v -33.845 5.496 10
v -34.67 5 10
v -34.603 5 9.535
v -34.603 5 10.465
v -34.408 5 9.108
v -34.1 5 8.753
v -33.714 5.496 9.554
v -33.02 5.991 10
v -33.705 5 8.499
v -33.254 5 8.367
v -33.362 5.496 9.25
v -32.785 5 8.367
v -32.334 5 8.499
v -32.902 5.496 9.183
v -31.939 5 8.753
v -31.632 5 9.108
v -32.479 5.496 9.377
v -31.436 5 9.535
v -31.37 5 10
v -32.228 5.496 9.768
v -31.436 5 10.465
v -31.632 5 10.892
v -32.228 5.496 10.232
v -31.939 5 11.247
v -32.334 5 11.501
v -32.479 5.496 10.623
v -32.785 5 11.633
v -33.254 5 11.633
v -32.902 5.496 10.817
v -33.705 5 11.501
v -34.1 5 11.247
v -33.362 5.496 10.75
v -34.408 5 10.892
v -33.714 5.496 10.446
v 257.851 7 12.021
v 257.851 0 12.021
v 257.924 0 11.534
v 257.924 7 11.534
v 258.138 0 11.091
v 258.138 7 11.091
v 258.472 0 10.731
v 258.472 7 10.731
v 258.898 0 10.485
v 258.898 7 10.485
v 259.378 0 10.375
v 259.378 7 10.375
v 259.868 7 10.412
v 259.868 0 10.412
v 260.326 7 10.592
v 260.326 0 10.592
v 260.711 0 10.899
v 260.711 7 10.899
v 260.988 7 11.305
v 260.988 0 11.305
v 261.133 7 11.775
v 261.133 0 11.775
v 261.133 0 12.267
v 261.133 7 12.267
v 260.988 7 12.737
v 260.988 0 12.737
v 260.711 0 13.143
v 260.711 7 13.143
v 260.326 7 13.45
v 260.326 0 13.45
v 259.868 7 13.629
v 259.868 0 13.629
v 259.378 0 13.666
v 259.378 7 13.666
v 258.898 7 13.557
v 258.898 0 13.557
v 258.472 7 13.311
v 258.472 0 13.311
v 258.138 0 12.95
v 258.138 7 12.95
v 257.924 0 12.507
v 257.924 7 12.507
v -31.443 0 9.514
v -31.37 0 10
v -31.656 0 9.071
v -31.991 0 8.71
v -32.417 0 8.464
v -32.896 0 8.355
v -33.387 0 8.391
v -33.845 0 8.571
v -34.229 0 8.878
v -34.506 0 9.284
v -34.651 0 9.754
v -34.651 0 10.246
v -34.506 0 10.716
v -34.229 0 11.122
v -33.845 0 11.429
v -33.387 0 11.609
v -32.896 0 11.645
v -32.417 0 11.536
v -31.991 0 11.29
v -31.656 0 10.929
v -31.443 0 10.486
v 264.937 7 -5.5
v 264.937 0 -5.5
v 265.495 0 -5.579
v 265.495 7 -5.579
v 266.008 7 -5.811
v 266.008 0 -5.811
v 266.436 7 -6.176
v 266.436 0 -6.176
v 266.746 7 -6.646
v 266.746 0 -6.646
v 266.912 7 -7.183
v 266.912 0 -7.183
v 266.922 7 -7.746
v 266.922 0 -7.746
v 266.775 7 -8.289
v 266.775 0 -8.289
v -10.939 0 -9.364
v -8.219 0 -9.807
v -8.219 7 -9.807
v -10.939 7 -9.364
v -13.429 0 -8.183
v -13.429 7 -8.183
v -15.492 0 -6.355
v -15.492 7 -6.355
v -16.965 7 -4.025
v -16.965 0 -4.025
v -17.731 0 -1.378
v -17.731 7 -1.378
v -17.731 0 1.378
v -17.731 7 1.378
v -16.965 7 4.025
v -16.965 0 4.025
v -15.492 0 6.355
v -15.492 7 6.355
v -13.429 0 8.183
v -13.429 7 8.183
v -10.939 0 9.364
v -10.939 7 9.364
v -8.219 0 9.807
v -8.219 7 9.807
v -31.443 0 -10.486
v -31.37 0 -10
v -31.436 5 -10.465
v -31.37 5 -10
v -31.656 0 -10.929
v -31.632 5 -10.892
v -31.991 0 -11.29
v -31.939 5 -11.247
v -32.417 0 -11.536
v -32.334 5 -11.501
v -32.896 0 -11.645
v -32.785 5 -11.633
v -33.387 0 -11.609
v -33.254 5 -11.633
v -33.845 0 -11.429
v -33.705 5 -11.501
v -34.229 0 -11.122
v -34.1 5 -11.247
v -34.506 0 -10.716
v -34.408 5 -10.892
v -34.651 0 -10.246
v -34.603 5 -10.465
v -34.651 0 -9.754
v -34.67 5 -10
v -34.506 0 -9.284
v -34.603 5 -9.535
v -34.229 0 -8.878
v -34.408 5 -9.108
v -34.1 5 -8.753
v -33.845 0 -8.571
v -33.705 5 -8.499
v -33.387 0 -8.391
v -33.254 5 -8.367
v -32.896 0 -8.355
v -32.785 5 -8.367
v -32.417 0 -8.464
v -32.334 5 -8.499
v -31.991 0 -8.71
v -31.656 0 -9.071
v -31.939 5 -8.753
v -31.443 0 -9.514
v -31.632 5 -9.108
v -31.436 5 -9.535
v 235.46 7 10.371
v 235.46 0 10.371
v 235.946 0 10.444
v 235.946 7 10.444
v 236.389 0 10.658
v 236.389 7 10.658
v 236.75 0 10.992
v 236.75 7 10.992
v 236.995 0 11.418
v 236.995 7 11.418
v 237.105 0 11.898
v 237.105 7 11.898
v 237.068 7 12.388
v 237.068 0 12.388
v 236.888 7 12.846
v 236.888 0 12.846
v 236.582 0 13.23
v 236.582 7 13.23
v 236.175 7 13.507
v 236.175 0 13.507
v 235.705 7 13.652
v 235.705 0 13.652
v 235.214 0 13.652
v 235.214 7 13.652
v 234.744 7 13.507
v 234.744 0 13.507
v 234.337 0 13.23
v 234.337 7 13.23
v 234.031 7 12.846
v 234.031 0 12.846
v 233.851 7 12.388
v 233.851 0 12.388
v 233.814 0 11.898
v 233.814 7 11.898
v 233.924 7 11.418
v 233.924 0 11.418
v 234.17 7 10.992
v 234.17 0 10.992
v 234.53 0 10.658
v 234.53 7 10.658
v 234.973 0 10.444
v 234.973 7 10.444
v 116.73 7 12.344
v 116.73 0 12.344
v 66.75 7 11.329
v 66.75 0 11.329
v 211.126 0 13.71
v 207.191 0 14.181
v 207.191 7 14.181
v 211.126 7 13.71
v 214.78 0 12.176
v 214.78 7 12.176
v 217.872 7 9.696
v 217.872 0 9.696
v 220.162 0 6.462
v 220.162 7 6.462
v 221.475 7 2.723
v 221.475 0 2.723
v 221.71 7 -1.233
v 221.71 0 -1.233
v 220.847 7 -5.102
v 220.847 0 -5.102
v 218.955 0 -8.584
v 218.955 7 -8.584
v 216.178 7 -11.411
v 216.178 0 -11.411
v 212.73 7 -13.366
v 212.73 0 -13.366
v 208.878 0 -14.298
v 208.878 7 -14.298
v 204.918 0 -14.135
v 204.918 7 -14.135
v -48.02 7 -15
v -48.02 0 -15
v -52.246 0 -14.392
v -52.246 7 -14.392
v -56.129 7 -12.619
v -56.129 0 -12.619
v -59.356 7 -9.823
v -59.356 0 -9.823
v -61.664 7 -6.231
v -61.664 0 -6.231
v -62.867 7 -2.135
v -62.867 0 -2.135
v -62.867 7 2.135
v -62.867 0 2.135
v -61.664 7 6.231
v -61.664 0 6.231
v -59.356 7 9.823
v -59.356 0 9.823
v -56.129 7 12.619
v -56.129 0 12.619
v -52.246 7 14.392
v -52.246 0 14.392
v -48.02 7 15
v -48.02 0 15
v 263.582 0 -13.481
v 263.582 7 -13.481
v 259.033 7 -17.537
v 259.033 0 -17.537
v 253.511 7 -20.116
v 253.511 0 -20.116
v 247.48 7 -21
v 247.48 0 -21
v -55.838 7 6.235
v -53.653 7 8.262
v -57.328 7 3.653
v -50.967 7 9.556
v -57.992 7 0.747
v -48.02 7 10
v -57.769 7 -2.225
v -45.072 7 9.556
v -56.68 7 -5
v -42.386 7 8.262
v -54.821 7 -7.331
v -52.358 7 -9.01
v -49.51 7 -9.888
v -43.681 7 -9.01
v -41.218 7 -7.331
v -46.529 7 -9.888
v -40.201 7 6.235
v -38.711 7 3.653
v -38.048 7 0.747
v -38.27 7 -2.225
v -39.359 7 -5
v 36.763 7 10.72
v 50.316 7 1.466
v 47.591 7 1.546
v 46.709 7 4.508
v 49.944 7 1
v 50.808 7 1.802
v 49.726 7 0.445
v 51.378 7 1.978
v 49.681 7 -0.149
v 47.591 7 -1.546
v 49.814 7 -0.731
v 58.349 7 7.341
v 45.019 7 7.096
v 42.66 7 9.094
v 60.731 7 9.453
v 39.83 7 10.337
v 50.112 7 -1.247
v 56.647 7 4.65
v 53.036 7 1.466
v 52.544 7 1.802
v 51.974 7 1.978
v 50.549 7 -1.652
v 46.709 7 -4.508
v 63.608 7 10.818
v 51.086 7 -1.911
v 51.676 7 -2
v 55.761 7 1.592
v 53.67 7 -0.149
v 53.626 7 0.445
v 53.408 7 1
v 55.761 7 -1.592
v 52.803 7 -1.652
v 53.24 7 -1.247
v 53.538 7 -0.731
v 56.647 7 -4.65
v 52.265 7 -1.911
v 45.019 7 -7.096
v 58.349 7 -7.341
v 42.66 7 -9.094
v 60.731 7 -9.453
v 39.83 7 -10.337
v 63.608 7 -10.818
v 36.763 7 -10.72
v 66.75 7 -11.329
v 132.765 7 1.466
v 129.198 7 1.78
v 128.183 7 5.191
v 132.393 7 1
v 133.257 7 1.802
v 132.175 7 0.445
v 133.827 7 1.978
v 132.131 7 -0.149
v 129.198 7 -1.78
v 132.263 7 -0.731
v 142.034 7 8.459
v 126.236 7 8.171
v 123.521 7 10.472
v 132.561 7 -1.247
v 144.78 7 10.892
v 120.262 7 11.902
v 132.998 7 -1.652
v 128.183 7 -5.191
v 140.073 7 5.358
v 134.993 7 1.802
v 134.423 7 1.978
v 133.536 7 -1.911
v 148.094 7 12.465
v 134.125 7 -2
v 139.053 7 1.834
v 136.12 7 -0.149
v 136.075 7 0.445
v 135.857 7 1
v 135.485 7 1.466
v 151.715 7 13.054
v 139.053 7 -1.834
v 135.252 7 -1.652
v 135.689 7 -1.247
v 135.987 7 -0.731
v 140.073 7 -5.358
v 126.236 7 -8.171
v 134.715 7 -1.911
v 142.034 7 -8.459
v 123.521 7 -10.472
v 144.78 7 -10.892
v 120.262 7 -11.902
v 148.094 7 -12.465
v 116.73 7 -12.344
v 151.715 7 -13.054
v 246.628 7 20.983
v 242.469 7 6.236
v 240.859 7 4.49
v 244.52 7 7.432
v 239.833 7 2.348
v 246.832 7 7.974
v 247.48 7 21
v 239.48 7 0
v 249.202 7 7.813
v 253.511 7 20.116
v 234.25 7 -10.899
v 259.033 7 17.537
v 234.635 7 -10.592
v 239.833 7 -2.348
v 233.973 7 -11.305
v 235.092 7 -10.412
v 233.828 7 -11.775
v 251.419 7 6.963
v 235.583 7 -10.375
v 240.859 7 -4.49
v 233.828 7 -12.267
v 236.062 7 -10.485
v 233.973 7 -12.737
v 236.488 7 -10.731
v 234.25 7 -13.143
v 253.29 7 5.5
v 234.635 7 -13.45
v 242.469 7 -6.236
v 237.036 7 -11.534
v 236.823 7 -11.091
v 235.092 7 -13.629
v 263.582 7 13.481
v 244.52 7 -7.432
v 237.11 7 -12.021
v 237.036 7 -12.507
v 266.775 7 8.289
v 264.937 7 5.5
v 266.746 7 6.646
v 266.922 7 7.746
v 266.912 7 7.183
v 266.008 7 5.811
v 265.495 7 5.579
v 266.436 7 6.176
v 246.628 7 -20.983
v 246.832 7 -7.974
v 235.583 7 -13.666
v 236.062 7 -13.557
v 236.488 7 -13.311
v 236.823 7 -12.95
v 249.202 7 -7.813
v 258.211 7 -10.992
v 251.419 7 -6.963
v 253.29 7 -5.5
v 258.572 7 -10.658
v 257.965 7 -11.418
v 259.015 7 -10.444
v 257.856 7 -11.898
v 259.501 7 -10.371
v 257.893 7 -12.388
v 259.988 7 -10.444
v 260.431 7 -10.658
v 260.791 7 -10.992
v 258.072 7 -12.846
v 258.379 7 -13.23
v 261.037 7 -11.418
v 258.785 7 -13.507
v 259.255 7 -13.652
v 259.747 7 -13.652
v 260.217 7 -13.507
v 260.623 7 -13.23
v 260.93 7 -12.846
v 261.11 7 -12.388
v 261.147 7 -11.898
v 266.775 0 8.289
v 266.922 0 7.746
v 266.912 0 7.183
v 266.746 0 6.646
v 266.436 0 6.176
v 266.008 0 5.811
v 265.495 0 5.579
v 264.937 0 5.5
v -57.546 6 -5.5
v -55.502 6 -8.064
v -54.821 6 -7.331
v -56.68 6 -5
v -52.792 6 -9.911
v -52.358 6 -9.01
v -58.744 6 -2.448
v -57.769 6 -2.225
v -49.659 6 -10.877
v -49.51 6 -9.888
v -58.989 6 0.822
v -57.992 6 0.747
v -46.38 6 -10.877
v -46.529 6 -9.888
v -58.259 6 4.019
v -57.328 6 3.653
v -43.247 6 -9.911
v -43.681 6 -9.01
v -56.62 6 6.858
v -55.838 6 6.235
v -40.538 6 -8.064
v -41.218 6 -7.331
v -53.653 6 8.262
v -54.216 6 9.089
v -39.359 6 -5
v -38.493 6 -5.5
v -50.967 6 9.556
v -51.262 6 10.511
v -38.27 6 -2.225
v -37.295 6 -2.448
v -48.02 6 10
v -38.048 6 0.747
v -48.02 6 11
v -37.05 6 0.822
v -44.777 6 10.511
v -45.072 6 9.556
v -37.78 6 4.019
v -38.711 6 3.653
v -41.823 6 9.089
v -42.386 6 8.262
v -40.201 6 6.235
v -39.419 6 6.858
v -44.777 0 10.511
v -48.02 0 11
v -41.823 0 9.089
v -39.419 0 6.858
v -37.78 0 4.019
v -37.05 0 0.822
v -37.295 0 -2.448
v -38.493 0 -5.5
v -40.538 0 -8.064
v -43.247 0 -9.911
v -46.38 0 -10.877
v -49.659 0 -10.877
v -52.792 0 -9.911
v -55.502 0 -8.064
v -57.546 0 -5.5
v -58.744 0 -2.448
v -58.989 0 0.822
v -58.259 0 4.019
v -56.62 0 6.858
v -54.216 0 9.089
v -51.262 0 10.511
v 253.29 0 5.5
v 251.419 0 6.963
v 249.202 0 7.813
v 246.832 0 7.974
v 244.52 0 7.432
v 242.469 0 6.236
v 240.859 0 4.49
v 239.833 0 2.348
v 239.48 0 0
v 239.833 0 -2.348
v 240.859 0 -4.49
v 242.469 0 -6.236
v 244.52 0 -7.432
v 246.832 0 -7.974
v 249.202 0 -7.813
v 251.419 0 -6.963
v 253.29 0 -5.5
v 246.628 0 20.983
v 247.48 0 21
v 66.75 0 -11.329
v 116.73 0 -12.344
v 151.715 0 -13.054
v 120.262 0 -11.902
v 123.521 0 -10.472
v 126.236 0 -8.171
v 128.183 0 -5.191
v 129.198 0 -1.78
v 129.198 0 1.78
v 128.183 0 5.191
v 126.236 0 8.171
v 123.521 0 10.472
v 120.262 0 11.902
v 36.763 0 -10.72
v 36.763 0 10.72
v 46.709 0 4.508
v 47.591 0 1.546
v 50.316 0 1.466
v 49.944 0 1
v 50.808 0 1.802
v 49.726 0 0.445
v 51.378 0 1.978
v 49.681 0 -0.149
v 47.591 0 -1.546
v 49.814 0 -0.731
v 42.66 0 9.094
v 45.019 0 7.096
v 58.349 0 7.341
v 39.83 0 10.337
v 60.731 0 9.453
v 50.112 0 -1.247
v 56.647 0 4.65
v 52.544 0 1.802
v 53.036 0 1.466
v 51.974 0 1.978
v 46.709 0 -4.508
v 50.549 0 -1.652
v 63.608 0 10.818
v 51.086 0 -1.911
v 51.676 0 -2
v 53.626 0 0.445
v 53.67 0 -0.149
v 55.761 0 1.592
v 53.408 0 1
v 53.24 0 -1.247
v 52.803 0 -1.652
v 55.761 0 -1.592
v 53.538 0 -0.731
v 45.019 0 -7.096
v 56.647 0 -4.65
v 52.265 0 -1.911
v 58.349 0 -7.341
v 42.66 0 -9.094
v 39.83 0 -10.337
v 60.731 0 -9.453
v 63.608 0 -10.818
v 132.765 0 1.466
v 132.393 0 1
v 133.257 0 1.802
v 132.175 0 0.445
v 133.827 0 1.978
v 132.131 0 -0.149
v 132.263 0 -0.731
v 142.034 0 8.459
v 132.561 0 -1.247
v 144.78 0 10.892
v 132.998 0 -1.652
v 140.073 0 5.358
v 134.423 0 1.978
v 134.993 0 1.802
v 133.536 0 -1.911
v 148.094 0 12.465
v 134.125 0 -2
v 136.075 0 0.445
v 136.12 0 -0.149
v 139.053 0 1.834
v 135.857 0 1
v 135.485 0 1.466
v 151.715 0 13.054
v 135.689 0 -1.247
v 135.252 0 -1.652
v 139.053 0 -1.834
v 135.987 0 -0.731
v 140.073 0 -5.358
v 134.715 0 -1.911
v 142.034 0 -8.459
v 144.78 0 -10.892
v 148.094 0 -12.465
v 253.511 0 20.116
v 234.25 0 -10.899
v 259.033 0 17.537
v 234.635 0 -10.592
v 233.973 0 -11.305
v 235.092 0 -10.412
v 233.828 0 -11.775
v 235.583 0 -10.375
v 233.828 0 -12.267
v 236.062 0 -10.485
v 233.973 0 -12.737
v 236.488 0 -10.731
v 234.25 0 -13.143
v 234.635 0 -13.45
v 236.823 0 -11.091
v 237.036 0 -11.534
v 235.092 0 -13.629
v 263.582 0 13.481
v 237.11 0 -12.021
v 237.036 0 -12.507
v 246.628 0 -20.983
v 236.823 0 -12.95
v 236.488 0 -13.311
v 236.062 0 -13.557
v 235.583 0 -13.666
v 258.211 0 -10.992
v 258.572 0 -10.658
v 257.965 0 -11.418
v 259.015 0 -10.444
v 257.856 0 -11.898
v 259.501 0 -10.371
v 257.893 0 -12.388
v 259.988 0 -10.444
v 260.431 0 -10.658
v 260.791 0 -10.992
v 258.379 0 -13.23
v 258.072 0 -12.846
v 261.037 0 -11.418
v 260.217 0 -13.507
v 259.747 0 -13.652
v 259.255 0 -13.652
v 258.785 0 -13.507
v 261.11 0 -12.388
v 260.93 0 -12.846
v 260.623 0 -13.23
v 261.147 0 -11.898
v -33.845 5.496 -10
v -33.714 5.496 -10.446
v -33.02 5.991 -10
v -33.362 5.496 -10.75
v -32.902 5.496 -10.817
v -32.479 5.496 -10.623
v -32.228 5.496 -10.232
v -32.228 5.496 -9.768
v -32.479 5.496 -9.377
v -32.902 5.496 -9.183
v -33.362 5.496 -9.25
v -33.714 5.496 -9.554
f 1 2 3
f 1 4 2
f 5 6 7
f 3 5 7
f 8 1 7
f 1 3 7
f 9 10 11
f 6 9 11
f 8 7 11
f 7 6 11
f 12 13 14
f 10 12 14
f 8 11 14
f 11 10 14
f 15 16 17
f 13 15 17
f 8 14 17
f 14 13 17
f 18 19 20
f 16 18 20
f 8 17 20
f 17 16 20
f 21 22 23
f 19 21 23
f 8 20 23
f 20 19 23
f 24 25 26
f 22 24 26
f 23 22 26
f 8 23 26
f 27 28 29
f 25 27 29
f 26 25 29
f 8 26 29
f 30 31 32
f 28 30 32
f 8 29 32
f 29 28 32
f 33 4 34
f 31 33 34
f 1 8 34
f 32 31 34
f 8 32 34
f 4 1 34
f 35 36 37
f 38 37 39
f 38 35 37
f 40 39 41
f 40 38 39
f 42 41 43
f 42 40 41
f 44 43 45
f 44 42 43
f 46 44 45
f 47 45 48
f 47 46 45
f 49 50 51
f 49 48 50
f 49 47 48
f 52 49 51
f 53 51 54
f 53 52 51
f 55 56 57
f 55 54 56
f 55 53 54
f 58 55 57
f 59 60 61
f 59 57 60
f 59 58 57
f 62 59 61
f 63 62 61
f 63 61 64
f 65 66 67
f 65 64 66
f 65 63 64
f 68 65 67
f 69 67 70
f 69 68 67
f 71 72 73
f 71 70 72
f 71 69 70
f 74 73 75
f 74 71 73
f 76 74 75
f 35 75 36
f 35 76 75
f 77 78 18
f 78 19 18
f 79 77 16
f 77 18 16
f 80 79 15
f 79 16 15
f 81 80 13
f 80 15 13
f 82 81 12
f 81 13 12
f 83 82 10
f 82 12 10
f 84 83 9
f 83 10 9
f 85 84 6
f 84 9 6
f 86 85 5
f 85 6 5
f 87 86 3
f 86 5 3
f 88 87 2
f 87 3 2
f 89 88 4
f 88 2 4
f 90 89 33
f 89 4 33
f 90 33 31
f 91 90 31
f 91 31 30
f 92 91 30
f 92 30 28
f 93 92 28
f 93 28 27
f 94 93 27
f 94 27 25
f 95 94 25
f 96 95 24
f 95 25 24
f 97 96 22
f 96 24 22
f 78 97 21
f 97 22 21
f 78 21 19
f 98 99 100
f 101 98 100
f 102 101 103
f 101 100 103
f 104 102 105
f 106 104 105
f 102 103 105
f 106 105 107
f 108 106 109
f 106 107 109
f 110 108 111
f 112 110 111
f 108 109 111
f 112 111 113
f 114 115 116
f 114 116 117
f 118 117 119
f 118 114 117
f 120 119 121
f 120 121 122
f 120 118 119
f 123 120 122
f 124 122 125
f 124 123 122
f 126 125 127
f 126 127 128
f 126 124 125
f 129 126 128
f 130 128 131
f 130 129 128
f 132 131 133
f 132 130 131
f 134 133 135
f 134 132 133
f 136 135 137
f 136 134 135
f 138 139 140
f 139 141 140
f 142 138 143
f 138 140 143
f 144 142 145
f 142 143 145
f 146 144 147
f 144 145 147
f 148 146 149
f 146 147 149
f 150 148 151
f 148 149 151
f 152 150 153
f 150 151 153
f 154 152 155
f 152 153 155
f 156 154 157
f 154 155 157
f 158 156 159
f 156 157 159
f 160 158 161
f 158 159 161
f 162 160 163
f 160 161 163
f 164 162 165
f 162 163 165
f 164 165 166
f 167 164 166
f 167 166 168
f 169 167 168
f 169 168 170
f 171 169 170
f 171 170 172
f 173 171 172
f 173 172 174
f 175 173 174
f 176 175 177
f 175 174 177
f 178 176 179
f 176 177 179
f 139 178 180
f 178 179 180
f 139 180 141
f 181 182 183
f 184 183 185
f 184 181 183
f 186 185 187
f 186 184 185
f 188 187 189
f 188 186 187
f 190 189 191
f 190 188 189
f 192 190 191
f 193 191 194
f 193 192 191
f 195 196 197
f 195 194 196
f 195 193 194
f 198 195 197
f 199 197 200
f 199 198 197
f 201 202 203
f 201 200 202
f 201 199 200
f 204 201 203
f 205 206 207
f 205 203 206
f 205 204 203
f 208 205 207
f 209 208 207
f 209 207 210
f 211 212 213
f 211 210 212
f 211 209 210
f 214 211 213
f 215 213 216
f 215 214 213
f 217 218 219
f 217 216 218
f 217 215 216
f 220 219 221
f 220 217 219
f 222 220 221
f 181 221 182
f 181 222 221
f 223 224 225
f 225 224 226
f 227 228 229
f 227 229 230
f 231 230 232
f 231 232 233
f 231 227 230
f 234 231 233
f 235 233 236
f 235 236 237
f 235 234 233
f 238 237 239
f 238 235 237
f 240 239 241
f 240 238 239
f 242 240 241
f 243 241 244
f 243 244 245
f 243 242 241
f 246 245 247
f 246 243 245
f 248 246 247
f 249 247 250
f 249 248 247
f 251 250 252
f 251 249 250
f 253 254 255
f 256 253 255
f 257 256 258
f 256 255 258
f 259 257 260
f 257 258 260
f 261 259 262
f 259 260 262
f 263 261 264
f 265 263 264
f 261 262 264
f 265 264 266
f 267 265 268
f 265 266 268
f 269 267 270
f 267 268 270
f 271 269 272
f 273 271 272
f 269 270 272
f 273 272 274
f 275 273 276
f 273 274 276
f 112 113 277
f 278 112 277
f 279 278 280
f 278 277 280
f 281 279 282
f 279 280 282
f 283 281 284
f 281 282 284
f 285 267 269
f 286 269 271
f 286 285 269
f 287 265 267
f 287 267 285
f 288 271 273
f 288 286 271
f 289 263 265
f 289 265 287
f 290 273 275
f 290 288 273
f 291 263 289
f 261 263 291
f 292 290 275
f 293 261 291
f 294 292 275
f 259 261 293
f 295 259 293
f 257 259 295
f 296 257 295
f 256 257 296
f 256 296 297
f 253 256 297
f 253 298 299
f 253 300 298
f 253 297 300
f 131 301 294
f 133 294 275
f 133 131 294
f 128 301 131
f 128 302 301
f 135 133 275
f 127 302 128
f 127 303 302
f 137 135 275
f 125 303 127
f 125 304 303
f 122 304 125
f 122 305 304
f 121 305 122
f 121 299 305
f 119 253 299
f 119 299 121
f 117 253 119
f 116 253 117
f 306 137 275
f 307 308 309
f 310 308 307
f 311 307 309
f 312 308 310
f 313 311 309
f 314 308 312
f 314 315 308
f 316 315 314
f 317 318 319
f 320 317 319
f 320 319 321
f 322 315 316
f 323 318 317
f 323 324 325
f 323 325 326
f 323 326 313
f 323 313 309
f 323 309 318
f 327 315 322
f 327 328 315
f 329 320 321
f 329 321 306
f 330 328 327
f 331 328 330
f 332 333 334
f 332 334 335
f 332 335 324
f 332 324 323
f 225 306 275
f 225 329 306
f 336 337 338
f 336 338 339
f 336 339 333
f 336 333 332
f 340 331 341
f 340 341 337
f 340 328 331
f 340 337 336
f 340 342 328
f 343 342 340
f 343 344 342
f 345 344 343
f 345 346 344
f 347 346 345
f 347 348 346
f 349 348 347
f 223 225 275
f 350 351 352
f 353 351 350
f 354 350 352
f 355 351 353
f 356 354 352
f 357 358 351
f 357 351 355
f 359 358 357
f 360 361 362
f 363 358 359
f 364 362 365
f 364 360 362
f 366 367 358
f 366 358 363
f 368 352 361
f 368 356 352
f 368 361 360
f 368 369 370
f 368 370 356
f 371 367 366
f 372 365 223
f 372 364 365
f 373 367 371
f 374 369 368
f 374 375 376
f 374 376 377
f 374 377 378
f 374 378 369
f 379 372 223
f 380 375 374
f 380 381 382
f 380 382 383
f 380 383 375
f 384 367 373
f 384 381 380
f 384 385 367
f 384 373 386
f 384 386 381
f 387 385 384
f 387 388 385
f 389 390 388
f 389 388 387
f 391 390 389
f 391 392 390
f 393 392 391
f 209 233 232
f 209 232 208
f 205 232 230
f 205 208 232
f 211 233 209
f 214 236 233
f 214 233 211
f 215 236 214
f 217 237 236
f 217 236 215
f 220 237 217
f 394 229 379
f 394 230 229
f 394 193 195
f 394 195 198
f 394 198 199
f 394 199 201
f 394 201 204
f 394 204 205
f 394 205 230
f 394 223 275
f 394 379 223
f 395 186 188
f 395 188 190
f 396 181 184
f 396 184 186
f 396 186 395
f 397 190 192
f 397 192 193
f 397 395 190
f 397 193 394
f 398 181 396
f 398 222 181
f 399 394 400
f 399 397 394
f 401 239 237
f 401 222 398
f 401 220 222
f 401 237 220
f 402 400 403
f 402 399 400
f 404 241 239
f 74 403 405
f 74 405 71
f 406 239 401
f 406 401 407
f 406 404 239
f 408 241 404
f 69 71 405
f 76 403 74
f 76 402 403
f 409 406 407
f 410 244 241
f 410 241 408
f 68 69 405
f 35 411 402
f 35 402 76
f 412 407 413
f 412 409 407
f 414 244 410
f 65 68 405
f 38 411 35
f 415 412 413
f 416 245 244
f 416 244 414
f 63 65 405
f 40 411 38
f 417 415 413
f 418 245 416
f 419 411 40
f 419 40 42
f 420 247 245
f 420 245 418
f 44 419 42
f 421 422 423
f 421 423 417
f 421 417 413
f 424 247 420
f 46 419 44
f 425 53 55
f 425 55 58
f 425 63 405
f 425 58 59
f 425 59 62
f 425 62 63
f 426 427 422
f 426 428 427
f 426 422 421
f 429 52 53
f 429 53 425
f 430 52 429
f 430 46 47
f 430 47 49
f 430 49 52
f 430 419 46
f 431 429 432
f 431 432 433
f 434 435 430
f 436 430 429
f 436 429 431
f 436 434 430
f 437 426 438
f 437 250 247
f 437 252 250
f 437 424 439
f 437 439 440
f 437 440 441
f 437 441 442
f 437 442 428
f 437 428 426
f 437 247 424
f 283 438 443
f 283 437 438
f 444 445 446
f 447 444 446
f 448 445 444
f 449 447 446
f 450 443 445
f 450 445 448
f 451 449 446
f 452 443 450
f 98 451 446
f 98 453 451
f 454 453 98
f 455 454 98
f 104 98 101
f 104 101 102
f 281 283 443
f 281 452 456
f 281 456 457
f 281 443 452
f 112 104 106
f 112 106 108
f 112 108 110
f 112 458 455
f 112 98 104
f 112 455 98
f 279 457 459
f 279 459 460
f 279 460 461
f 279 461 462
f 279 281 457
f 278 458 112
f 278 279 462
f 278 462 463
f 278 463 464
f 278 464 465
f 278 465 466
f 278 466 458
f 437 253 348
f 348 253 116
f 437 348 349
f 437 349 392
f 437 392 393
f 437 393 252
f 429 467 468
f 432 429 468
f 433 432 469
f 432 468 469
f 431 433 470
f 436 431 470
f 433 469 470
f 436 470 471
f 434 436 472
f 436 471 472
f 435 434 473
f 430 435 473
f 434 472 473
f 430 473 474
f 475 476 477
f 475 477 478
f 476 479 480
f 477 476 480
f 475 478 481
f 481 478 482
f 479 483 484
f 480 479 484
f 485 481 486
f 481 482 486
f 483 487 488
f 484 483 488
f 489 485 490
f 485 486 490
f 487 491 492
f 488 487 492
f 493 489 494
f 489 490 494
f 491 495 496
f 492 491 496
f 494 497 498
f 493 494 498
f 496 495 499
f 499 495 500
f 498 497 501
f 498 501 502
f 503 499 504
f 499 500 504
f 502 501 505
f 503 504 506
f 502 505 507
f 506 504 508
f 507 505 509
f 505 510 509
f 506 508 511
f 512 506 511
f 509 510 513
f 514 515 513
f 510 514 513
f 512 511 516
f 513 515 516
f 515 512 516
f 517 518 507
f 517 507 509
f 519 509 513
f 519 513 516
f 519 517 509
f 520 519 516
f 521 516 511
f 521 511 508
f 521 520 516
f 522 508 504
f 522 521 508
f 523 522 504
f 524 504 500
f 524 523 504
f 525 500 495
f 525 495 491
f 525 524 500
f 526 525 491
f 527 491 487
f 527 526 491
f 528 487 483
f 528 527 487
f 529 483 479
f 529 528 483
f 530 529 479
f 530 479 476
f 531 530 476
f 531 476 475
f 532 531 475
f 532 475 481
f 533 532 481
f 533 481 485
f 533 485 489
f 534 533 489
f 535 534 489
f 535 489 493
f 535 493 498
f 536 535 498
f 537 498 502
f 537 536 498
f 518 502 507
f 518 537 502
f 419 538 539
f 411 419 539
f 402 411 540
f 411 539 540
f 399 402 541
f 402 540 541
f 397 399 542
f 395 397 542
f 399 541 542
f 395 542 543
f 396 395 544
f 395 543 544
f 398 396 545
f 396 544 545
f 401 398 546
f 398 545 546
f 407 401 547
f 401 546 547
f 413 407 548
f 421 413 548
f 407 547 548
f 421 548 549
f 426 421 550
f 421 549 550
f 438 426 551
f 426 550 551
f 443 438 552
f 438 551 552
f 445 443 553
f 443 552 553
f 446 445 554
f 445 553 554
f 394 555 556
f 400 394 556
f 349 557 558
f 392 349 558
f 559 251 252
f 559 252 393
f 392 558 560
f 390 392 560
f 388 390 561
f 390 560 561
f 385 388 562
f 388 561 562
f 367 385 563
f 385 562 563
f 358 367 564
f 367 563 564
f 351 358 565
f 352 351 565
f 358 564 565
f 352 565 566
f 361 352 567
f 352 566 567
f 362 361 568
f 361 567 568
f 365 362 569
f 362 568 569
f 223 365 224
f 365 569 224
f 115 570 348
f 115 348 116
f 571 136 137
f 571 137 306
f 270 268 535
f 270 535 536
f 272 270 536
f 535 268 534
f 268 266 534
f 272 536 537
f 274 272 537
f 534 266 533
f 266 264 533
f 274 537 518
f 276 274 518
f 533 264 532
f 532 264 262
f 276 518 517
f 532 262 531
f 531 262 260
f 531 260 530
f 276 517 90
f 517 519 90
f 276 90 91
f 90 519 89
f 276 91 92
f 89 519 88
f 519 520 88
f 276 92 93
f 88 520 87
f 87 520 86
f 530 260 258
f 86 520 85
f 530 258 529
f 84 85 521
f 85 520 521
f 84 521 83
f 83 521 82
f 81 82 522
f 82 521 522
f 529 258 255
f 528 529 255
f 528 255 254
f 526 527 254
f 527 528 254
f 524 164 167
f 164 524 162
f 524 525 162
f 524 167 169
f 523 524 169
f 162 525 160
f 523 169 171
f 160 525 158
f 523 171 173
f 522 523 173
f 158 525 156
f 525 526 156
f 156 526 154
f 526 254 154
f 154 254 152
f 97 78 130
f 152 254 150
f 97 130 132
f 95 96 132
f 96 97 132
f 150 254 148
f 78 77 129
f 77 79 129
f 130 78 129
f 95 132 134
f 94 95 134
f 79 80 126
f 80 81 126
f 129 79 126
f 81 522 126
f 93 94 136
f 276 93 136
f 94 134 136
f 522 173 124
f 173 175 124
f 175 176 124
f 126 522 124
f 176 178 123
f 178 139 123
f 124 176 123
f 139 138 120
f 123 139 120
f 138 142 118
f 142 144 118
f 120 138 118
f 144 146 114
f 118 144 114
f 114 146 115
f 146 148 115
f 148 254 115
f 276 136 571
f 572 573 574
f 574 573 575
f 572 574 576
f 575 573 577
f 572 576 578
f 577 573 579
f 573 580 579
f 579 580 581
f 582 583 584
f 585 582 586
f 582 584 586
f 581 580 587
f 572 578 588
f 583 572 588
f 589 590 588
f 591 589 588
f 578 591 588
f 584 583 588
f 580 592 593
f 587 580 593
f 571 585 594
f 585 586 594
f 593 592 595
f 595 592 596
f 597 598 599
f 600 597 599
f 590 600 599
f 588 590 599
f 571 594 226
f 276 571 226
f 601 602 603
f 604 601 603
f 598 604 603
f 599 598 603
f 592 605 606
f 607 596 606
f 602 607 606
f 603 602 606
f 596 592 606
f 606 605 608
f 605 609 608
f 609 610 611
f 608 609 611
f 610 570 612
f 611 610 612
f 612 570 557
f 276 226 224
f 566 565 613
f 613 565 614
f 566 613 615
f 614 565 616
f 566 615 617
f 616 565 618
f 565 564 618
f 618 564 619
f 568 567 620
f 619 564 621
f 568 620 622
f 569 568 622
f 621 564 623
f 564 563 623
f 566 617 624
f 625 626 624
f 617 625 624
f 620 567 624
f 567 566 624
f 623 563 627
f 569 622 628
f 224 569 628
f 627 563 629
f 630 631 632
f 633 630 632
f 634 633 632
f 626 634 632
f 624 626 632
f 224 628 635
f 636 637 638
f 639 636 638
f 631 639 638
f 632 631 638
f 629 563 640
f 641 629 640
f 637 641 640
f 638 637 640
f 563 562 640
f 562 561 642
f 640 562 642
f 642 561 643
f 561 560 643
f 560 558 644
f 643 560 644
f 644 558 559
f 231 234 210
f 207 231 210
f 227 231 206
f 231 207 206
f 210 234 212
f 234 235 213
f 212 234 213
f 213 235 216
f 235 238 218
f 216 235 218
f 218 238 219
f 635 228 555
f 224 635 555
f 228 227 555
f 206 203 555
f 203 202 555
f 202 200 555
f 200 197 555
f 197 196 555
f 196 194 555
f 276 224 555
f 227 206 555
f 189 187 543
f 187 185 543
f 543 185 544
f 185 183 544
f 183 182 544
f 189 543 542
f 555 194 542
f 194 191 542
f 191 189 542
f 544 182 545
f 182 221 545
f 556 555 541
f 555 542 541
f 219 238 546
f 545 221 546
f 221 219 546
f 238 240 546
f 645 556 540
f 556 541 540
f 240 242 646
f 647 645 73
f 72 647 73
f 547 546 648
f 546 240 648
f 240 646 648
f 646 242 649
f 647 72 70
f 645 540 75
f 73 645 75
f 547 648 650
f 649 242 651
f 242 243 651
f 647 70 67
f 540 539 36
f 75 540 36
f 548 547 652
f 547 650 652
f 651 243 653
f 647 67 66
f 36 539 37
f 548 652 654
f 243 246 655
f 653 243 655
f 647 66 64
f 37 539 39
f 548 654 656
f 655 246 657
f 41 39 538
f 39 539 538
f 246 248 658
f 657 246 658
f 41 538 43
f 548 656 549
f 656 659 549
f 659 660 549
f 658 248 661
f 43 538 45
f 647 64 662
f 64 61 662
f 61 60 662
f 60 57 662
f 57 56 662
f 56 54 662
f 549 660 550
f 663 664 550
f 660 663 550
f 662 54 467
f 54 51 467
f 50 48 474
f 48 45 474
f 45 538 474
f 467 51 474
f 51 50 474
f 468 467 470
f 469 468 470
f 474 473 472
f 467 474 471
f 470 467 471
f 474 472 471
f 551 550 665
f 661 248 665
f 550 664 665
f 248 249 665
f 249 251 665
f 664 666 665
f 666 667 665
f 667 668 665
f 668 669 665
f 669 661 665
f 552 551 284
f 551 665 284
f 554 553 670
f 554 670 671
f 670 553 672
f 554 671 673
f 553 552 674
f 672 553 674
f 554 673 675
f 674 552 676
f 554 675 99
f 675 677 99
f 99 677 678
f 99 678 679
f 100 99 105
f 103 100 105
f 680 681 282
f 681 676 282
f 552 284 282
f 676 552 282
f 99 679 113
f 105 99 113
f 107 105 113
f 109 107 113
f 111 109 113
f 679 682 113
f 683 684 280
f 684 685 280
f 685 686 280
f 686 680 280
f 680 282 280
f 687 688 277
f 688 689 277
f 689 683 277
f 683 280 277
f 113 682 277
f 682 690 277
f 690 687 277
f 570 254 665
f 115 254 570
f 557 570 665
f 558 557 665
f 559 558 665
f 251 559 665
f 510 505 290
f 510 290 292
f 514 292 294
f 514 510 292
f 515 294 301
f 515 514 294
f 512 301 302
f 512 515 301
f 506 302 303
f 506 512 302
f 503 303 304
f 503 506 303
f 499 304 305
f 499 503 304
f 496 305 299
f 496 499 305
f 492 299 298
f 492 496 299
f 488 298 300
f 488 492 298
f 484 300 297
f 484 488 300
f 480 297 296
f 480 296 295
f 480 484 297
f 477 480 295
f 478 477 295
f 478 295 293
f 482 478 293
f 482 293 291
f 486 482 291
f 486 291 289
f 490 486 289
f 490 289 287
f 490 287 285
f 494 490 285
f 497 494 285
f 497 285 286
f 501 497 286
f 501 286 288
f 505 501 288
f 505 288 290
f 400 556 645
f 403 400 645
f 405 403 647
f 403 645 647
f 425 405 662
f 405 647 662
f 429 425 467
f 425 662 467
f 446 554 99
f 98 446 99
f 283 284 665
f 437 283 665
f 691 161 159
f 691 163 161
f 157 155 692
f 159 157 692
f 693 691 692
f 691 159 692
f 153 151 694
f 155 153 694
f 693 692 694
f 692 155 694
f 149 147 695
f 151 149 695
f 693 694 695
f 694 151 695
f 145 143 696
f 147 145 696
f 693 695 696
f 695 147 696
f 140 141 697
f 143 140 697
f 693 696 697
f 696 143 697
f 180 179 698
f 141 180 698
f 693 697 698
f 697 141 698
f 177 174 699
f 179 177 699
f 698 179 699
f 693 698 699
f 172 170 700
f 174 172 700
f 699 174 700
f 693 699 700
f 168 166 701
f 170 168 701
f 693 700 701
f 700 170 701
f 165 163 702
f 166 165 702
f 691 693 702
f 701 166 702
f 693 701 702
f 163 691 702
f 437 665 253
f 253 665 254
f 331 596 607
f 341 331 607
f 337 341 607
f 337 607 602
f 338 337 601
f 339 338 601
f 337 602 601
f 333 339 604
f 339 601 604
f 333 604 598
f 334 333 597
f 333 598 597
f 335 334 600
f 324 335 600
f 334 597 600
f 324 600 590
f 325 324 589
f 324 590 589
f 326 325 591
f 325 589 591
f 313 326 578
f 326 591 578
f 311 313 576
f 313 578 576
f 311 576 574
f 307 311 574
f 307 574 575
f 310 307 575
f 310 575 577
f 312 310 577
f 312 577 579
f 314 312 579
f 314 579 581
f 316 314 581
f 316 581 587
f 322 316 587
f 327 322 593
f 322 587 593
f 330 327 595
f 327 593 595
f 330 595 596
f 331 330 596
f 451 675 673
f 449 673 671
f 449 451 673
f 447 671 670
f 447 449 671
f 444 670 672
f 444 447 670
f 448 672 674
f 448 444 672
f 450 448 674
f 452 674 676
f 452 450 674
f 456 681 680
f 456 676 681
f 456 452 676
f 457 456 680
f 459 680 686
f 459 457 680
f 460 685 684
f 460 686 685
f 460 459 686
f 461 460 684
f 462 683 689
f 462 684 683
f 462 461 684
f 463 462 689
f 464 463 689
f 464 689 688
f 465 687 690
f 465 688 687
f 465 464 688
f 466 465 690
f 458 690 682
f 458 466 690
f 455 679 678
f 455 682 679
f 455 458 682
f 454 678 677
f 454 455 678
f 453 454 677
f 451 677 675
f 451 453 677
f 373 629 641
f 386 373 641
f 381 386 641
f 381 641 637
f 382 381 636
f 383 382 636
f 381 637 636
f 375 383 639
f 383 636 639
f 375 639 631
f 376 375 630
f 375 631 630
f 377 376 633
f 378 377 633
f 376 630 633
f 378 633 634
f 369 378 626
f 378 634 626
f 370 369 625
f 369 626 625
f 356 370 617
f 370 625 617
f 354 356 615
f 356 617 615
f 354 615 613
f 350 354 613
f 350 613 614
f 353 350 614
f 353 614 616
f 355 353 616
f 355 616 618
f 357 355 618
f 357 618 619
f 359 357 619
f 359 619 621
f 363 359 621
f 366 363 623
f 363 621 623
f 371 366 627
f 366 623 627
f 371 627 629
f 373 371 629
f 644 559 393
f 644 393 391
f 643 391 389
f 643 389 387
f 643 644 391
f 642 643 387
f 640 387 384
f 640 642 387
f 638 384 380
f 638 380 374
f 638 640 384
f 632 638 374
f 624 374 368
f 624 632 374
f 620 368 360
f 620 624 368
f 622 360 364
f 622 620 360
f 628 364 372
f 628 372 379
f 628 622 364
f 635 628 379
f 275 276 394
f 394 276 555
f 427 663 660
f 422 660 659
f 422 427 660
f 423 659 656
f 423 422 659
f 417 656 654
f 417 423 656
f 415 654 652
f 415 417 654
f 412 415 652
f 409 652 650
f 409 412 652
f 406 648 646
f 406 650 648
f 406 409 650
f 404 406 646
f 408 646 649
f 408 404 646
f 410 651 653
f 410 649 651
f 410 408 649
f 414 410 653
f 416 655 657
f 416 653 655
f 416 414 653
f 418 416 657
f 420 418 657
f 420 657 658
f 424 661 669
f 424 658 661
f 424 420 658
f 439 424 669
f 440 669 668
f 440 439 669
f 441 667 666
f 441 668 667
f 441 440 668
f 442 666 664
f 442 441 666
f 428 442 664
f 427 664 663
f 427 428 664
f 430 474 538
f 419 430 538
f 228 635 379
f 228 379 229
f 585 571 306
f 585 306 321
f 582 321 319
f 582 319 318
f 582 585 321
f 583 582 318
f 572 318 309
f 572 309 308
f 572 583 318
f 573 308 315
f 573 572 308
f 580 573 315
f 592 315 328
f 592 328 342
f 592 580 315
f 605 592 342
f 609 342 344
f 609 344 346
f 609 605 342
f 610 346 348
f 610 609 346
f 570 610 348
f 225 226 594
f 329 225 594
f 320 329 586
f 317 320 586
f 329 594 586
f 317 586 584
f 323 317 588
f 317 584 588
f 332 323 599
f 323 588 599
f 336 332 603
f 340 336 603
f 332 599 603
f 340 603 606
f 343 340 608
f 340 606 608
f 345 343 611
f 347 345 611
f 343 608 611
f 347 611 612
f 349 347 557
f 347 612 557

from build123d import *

# Parameters (mm, degrees)
SKETCH1_R             = 10
BOSS_EXTRUDE1_DEPTH   = 7
CIRPATTERN1_COUNT     = 4
SKETCH4_R             = 11
CUT_EXTRUDE2_DEPTH    = 6
M4_TAPPED_HOLE1_D     = 3.3
M4_TAPPED_HOLE1_DEPTH = 5
M4_TAPPED_HOLE1_TIP   = 0.991420021
SKETCH7_R             = 2
CUT_EXTRUDE3_DEPTH    = 7


with BuildPart() as part:
    # Sketch1 → Boss-Extrude1 (new body)
    with BuildSketch(Plane(origin=(0, 0, 0), x_dir=(1, 0, 0), z_dir=(0, 1, 0))):
        with BuildLine():
            Line((246.627930173, -20.982691565), (247.480370611, -21))
            ThreePointArc((247.480370611, -21), (259.0328823, -17.536803406), (266.775049308, -8.289473684))
            ThreePointArc((266.775049308, -8.289473684), (266.607632614, -6.399760792), (264.937460861, -5.5))
            Line((264.937460861, -5.5), (253.28984563, -5.5))
            ThreePointArc((253.28984563, -5.5), (239.480370611, 0), (253.28984563, 5.5))
            Line((253.28984563, 5.5), (264.937460861, 5.5))
            ThreePointArc((264.937460861, 5.5), (266.607632614, 6.399760792), (266.775049308, 8.289473684))
            ThreePointArc((266.775049308, 8.289473684), (259.0328823, 17.536803406), (247.480370611, 21))
            Line((247.480370611, 21), (246.627930173, 20.982691565))
            Line((246.627930173, 20.982691565), (-48.019629389, 15))
            ThreePointArc((-48.019629389, 15), (-63.019629389, 0), (-48.019629389, -15))
            Line((-48.019629389, -15), (246.627930173, -20.982691565))
        make_face()
        with Locations((-48.019629389, 0)):
            Circle(SKETCH1_R, mode=Mode.SUBTRACT)
    extrude(amount=BOSS_EXTRUDE1_DEPTH)

    # Sketch3 → Tap Drill for M4 Tap1 (revolve, cut)
    with BuildSketch(Plane(origin=(259.501185891, 7, -12.02081528), x_dir=(0, 0, 1), z_dir=(1, 0, 0))):
        Polygon((0, 0), (0, 8.991420021), (1.65, 8), (1.65, 0), align=None)
    tap_drill_for_m4_tap1 = revolve(axis=Axis((259.501185891, 13.35, -12.02081528), (0, -1, 0)), mode=Mode.SUBTRACT)

    # CirPattern1: Tap Drill for M4 Tap1 ×4 about axis
    cirpattern1_axis = Axis((247.480370611, 52.133884237, 0), (0, -1, 0))
    for i in range(1, CIRPATTERN1_COUNT):
        add(tap_drill_for_m4_tap1.rotate(cirpattern1_axis, i * 360 / CIRPATTERN1_COUNT), mode=Mode.SUBTRACT)

    # Sketch4 → Cut-Extrude2 (cut)
    with BuildSketch(Plane(origin=(0, 0, 0), x_dir=(1, 0, 0), z_dir=(0, 1, 0))):
        with Locations((-48.019629389, 0)):
            Circle(SKETCH4_R)
    extrude(amount=CUT_EXTRUDE2_DEPTH, mode=Mode.SUBTRACT)

    # M4 Tapped Hole1
    with Locations(Plane(origin=(0, 0, 0), x_dir=(-1, 0, 0), z_dir=(0, -1, 0))):
        with Locations((33.019629389, -10), (33.019629389, 10)):
            Hole(M4_TAPPED_HOLE1_D / 2, depth=M4_TAPPED_HOLE1_DEPTH)
            with Locations((0, 0, -(M4_TAPPED_HOLE1_DEPTH + M4_TAPPED_HOLE1_TIP / 2))):  # 118° drill point
                Cone(0, M4_TAPPED_HOLE1_D / 2, M4_TAPPED_HOLE1_TIP, mode=Mode.SUBTRACT)

    # Sketch7 → Cut-Extrude3 (cut)
    with BuildSketch(Plane(origin=(0, 0, 0), x_dir=(-1, 0, 0), z_dir=(0, -1, 0))):
        with Locations((-134.125113886, 0)):
            Circle(SKETCH7_R)
        with Locations((-51.675864847, 0)):
            Circle(SKETCH7_R)
        with BuildLine():
            Line((8.218754321, -9.806902896), (-36.762700927, -10.720231937))
            ThreePointArc((-36.762700927, -10.720231937), (-47.702812165, 0), (-36.762700927, 10.720231937))
            Line((-36.762700927, 10.720231937), (8.218754321, 9.806902896))
            ThreePointArc((8.218754321, 9.806902896), (17.82855365, 0), (8.218754321, -9.806902896))
        make_face()
        with BuildLine():
            Line((-66.750337759, 11.329117964), (-116.729732479, 12.343928009))
            ThreePointArc((-116.729732479, 12.343928009), (-129.326842907, 0), (-116.729732479, -12.343928009))
            Line((-116.729732479, -12.343928009), (-66.750337759, -11.329117964))
            ThreePointArc((-66.750337759, -11.329117964), (-55.648917529, 0), (-66.750337759, 11.329117964))
        make_face()
        with BuildLine():
            Line((-151.715308783, -13.05429504), (-207.190686799, -14.180698655))
            ThreePointArc((-207.190686799, -14.180698655), (-221.709735655, 1.233303858), (-204.918313244, 14.13455909))
            Line((-204.918313244, 14.13455909), (-151.715308783, 13.05429504))
            ThreePointArc((-151.715308783, 13.05429504), (-138.923384865, 0), (-151.715308783, -13.05429504))
        make_face()
    extrude(amount=-CUT_EXTRUDE3_DEPTH, mode=Mode.SUBTRACT)


solid = part.part
